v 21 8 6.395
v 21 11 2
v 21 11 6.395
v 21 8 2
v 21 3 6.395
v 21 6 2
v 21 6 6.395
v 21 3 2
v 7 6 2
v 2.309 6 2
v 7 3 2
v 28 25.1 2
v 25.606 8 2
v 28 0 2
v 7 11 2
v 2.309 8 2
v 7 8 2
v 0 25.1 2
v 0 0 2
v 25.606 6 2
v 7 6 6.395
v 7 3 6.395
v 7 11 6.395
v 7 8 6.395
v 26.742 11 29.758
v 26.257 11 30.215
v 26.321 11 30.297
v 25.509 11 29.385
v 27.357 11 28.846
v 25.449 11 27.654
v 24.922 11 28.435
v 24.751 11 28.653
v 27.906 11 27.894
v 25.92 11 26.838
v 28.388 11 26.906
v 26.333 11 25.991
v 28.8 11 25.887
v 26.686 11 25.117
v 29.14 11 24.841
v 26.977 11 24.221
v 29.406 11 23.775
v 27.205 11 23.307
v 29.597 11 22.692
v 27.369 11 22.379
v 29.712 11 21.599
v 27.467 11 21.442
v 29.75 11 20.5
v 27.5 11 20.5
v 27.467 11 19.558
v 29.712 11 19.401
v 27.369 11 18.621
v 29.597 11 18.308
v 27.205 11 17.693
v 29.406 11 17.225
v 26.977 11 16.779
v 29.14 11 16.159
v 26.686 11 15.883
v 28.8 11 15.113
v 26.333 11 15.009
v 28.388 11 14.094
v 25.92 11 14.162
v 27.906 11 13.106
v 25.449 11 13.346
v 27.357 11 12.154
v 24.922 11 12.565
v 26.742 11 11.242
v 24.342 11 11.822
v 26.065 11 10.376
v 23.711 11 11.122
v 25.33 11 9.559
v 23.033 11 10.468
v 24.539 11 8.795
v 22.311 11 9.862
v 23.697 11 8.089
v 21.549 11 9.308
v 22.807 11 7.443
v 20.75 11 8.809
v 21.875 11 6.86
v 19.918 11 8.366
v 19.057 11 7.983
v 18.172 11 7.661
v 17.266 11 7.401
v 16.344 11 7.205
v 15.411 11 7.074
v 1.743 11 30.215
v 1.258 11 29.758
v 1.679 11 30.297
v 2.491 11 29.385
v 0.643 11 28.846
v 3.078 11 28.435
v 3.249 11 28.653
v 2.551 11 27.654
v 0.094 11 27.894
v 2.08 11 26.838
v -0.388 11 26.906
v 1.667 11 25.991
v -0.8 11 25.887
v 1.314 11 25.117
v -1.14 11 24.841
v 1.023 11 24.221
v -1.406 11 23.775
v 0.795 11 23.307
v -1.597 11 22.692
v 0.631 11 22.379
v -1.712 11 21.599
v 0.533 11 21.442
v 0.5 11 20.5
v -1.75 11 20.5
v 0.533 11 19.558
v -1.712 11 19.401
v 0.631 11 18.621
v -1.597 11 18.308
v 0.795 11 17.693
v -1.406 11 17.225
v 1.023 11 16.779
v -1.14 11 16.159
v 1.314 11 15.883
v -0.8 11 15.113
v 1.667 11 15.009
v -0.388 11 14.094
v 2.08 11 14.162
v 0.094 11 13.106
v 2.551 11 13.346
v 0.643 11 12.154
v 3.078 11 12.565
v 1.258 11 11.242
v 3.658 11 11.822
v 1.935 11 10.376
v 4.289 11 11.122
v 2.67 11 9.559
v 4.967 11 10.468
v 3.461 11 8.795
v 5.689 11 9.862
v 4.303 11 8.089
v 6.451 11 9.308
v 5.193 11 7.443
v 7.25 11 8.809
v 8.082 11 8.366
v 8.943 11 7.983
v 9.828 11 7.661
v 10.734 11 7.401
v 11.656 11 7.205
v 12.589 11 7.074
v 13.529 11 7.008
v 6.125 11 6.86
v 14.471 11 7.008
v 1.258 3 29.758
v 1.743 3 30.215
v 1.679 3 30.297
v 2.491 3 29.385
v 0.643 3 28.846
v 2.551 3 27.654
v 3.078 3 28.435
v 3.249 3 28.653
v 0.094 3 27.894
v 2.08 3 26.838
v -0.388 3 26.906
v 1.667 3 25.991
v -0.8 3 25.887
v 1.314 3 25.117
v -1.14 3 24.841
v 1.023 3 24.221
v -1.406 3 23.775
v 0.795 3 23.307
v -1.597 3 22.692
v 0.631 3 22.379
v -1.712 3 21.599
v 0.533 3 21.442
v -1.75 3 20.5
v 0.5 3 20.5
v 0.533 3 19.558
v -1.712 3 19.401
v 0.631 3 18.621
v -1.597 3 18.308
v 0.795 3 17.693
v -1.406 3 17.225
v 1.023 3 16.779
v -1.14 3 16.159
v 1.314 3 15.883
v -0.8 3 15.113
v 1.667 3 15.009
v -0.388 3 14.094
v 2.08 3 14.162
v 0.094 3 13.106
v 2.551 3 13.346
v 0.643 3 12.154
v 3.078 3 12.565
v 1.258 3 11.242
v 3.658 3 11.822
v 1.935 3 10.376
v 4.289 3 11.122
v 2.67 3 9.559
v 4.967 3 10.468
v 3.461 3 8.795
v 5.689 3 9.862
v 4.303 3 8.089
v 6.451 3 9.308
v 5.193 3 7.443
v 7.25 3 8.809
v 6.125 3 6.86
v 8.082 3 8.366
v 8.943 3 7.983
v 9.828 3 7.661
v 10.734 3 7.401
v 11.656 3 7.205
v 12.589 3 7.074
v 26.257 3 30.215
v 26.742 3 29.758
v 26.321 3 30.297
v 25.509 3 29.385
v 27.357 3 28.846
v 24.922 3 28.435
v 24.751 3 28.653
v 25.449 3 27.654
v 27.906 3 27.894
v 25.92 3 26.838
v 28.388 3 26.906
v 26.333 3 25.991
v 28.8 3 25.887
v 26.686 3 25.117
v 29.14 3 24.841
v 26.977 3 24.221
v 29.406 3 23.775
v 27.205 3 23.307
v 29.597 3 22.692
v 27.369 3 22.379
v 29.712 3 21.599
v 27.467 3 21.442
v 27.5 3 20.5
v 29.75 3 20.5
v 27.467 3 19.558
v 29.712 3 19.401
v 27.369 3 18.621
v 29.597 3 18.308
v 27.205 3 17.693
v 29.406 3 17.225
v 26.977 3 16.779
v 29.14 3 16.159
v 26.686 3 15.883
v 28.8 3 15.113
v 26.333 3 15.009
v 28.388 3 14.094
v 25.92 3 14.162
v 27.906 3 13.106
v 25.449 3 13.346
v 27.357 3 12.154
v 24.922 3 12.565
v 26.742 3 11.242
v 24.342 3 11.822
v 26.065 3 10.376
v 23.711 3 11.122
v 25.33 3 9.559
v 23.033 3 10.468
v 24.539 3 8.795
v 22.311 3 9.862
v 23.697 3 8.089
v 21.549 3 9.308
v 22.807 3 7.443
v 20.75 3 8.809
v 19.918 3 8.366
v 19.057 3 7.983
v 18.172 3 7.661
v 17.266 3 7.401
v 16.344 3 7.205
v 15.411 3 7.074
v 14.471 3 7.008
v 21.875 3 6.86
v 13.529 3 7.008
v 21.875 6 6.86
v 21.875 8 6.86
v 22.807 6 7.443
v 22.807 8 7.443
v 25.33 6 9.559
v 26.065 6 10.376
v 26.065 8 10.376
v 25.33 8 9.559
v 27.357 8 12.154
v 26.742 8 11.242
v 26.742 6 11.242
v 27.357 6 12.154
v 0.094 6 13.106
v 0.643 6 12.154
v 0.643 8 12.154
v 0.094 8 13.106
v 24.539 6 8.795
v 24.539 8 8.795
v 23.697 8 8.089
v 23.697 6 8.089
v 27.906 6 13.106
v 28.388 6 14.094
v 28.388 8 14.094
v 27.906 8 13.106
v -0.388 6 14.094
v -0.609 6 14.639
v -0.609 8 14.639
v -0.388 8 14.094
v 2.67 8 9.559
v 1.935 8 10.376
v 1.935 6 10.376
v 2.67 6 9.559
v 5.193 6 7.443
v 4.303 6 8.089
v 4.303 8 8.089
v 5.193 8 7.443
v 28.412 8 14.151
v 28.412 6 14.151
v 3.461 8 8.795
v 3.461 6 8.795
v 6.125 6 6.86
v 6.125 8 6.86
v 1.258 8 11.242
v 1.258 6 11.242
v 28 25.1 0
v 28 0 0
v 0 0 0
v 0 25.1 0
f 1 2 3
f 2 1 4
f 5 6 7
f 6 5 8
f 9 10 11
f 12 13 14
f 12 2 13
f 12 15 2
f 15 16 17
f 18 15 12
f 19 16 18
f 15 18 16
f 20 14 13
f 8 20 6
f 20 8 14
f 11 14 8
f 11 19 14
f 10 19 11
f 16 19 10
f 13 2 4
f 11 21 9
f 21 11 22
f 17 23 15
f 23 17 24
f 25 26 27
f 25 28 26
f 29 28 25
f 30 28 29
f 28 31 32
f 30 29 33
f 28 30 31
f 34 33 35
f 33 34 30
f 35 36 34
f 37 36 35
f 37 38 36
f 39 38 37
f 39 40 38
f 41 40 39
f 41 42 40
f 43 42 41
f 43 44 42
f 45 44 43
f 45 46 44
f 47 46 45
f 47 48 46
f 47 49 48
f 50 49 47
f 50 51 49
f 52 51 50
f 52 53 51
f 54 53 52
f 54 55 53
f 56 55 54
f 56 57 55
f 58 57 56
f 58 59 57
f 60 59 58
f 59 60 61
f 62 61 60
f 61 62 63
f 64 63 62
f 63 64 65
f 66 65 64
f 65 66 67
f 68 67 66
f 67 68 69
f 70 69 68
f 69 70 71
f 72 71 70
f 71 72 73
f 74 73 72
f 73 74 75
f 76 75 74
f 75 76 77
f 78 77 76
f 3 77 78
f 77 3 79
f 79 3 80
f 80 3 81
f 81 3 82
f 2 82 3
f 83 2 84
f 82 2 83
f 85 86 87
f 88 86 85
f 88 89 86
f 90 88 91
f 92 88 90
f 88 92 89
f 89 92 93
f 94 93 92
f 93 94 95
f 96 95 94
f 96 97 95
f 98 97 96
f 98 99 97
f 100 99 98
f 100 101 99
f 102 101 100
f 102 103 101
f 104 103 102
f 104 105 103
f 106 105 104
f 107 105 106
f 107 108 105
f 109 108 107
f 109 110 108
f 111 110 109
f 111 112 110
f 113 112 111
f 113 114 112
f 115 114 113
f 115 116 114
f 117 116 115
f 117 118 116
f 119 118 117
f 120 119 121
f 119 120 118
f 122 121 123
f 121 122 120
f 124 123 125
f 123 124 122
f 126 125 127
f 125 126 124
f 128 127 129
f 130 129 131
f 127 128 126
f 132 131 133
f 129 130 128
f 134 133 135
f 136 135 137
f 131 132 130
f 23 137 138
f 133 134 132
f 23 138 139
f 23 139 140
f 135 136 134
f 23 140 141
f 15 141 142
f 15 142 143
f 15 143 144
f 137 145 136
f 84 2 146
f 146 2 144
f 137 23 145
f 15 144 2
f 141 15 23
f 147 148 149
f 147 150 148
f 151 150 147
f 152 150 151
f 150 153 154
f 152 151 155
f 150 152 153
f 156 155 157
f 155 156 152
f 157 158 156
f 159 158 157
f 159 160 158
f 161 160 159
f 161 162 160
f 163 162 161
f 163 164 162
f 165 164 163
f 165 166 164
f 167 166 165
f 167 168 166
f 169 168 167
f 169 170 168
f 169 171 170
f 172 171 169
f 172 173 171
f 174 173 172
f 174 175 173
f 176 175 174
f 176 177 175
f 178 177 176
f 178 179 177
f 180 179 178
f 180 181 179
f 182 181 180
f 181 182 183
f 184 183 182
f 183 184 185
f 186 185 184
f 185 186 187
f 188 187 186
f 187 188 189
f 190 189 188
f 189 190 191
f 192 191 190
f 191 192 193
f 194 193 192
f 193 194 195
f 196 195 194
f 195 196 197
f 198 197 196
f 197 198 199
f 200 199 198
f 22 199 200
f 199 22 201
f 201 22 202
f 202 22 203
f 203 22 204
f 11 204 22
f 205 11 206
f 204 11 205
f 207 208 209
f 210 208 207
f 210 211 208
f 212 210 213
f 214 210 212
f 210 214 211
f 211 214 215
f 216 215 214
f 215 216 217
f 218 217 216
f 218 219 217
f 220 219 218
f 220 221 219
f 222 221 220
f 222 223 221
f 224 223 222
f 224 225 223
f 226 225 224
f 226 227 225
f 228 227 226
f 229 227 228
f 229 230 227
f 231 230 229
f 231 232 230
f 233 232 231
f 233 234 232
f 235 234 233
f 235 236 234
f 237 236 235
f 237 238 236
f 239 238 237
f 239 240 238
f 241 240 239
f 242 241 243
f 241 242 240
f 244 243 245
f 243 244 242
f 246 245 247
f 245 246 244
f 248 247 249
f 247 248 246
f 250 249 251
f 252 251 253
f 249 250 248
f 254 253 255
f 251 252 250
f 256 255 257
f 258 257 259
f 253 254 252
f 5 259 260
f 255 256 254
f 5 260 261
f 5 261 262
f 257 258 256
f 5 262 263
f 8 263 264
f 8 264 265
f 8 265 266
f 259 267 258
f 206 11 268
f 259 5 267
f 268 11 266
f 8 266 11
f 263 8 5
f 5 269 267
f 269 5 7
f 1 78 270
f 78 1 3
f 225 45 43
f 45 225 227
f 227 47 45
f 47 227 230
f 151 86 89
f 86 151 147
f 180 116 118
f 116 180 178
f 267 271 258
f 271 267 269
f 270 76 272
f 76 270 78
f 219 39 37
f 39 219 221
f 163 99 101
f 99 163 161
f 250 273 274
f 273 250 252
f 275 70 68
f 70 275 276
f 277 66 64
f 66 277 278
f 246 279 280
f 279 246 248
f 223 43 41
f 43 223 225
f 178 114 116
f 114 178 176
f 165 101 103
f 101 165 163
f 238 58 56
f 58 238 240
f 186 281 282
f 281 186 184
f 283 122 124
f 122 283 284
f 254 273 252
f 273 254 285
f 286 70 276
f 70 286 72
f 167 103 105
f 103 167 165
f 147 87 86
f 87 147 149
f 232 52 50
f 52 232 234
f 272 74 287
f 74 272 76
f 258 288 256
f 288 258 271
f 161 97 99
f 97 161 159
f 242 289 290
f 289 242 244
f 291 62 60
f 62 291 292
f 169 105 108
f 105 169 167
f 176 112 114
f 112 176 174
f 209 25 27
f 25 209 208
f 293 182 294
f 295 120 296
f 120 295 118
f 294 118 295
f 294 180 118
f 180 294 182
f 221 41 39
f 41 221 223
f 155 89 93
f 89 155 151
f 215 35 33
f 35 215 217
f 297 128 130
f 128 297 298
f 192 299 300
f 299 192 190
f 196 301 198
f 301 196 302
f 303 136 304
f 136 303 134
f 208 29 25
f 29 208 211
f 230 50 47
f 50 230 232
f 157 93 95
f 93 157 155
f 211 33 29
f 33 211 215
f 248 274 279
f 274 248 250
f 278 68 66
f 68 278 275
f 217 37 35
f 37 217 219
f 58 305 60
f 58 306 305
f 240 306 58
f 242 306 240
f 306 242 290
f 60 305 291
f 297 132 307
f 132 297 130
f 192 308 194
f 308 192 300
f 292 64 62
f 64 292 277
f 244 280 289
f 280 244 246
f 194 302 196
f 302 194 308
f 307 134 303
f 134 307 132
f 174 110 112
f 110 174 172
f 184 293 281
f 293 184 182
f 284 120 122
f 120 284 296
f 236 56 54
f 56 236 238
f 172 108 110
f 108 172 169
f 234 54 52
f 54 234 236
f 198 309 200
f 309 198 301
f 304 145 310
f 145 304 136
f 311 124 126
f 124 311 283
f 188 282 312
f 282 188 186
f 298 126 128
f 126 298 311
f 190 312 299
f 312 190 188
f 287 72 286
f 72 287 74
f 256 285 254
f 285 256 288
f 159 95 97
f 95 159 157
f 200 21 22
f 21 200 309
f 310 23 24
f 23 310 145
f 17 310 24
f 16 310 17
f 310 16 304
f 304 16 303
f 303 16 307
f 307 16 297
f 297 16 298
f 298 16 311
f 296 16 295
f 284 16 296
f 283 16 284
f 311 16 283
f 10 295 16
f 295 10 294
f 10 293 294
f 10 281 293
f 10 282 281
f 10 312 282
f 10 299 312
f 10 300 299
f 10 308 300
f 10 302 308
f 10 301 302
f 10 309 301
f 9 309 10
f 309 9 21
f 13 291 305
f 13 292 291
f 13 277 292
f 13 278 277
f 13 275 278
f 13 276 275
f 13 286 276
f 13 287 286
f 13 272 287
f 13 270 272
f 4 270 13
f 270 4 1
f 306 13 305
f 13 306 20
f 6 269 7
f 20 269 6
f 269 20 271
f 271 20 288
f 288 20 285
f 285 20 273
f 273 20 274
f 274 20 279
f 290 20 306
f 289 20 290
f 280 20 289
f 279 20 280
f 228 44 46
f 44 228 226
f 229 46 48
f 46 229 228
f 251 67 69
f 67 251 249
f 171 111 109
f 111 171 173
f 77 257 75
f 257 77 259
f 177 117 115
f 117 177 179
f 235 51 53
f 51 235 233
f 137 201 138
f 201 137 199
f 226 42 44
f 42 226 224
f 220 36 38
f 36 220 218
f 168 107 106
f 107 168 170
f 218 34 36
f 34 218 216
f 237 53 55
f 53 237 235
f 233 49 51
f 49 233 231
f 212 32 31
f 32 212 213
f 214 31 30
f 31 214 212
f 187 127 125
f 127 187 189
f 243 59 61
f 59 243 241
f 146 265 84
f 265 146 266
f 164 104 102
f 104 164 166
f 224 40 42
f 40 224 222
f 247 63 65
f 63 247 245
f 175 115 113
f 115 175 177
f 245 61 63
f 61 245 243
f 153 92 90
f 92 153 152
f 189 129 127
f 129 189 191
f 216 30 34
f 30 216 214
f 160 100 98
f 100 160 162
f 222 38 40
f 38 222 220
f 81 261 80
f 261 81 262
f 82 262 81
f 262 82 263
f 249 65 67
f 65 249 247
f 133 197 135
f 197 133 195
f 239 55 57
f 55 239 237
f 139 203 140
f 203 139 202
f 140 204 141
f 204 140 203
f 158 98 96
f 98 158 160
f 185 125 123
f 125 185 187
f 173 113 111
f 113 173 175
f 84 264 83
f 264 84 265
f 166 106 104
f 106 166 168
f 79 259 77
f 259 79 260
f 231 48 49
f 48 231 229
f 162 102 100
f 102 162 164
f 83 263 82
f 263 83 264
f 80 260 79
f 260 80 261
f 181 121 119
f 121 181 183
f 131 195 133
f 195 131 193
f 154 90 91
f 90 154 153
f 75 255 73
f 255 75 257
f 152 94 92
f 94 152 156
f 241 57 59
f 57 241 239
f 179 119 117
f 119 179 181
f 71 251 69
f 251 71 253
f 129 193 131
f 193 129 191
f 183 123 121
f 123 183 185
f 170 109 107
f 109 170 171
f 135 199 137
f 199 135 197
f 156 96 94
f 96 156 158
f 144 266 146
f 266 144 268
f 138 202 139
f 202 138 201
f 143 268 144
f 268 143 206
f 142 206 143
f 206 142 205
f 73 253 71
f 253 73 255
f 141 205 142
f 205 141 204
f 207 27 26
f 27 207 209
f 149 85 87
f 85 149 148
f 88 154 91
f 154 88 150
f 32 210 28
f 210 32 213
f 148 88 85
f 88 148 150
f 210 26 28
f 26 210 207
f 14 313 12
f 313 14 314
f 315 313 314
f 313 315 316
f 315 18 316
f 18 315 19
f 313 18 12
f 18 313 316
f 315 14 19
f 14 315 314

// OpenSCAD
$fn = 90;

tubeDiameter = 27;

// Base plate
cube([28, 25.1, 2]);

// Mounting
translate([0, 1, 0]) {
    difference() {
        translate([0, 0, 0]) {
            translate([7, 2, 2]) {
                cube([14, 8, 6]);
            }
            translate([14, 10, 7 + tubeDiameter / 2]) {
                rotate([90, 0, 0]) {
                    cylinder(d = tubeDiameter + 4.5, h = 8);
                }
            } 
            
            // Left support
            rotate([0, -13, 0]) {
                translate([2.7, 5, 0]) {
                    cube([8, 2, 17]);
                }
            }
            
            // Right support
            rotate([0, 13, 0]) {
                translate([16.5, 5, 6]) {
                    cube([8, 2, 17]);
                }
            }
        } 
        {
            // Tube
            translate([14, 30, 7 + tubeDiameter / 2]) {
                rotate([90, 0, 0]) {
                    cylinder(d = tubeDiameter, h = 60);
                }
            }
            translate([14, 15, 7 + tubeDiameter / 2 + 20]) {
                rotate([90, 0, 0]) {
                    cylinder(d = tubeDiameter + 5, h = 30);
                }
            } 
        }
    }
}
